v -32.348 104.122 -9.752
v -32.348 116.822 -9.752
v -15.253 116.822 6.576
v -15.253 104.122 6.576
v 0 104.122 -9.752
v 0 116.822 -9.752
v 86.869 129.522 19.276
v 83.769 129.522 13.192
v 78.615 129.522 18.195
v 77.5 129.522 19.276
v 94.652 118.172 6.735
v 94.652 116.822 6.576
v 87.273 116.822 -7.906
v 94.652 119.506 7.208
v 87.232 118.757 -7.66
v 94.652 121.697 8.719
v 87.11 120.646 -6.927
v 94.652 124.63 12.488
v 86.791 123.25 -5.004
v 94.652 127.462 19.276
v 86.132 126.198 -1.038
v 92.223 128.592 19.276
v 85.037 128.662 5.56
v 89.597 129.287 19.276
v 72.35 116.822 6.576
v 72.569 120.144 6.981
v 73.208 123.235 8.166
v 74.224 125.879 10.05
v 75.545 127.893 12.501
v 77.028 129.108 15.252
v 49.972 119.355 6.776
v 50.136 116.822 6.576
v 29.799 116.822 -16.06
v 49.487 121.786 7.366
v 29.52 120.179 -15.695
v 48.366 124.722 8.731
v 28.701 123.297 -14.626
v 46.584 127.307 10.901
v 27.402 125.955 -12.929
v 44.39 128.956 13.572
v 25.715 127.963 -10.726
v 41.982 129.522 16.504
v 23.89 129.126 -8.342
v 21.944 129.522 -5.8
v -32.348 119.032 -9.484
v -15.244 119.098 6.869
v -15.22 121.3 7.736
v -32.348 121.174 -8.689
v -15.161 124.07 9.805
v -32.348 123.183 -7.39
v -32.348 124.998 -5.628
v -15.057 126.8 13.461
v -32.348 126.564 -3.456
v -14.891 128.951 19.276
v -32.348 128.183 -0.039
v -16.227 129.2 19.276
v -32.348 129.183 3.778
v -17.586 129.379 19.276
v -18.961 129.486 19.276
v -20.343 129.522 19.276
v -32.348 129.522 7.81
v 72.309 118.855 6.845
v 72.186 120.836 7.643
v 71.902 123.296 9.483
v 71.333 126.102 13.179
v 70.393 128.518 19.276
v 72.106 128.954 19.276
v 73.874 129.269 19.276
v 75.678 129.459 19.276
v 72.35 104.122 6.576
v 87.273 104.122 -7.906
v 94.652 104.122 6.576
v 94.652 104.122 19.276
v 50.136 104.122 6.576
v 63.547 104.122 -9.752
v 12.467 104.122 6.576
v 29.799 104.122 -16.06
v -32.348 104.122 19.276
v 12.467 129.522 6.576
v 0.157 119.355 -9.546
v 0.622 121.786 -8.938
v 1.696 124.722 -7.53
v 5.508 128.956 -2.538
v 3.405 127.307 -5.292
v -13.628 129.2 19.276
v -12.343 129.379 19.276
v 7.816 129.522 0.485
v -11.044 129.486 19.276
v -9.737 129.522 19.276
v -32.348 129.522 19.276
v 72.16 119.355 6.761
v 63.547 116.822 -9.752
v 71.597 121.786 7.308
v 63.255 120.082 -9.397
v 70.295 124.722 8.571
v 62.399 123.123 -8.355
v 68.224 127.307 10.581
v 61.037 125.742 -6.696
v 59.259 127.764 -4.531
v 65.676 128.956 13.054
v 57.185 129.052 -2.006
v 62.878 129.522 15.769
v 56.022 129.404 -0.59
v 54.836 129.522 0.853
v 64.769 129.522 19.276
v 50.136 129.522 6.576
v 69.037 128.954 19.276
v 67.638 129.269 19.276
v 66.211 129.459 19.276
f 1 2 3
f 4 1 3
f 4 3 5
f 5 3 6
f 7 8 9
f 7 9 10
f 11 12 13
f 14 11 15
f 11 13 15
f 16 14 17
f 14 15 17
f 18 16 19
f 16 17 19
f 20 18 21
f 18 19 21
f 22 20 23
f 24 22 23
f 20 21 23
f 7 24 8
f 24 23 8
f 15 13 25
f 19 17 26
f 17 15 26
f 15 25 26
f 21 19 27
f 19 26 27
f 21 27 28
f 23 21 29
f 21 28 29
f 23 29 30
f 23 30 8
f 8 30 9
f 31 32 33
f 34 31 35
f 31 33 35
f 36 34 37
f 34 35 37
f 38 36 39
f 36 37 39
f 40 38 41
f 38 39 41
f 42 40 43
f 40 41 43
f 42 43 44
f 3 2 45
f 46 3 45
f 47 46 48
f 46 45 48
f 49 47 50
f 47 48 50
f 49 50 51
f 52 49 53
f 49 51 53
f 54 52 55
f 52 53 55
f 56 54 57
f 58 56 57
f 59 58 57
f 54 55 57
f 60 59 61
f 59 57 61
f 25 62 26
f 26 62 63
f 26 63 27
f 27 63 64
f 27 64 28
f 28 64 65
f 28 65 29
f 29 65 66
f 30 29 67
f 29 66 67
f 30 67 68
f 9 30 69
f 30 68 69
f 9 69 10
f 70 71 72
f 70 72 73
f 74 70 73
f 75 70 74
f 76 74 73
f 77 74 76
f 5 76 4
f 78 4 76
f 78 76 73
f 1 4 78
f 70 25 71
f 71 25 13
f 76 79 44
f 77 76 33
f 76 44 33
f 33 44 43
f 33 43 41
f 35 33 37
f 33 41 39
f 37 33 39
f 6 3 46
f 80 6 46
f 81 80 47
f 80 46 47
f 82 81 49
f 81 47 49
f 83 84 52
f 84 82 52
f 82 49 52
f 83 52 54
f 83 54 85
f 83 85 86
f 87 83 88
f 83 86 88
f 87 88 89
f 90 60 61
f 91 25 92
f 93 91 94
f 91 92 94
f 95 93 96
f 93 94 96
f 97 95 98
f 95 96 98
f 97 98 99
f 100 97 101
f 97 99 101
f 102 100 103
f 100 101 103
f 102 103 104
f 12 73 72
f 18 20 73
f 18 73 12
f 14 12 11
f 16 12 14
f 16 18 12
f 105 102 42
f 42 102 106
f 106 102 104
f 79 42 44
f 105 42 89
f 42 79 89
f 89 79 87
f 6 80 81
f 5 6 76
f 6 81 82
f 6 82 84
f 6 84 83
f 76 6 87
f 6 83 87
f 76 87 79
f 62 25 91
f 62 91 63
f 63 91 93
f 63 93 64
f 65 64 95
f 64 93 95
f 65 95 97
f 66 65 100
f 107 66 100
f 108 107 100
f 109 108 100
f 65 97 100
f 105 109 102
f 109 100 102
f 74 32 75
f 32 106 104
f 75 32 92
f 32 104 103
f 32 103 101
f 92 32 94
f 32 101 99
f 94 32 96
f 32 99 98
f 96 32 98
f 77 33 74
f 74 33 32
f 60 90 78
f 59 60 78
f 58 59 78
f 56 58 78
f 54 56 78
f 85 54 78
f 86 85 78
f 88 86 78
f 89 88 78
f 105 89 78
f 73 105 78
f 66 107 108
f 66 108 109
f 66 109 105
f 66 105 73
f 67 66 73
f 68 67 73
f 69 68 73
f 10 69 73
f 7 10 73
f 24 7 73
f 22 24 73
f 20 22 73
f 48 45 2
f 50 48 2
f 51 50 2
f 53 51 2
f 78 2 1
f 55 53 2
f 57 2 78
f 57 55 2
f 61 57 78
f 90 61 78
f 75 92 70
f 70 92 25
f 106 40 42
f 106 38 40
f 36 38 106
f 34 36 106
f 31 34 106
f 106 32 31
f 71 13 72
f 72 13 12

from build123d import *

# Parameters (mm, degrees)
SKETCH1_W           = 127
SKETCH1_H           = 12.7
BOSS_EXTRUDE1_DEPTH = 25.4
BOSS_EXTRUDE2_DEPTH = 25.4
FILLET2_R           = 12.7


with BuildPart() as part:
    # Sketch1 → Boss-Extrude1 (new body)
    with BuildSketch(Plane(origin=(0, 129.522150418, 0), x_dir=(1, 0, 0), z_dir=(0, 1, 0))):
        with Locations((31.151863223, -12.926286206)):
            Rectangle(SKETCH1_W, SKETCH1_H)
    extrude(amount=-BOSS_EXTRUDE1_DEPTH)

    # Sketch2 → Boss-Extrude2 (add)
    with BuildSketch(Plane(origin=(0, 129.522150418, 0), x_dir=(1, 0, 0), z_dir=(0, 1, 0))):
        Polygon((-32.348136777, -6.576286206), (-32.348136777, 9.752049173), (-15.252779509, -6.576286206), (0, 9.752049173), (12.467334528, -6.576286206), (29.798968938, 16.059617503), (50.135874056, -6.576286206), (63.546845791, 9.752049173), (72.350442693, -6.576286206), (87.272954796, 7.906046983), (94.651863223, -6.576286206), (94.651863223, -10.496577103), (-32.348136777, -10.496577103), align=None)
    extrude(amount=-BOSS_EXTRUDE2_DEPTH)

    # Fillet2
    # the kernel refuses this fillet: 12.7 mm, written as the material it takes off along each edge
    with BuildSketch(Plane(origin=(-55.307939563, 129.522150418, -31.681708451), x_dir=(0, -1, 0), z_dir=(0.7231433948257096, 0, 0.6906979300098909))) as fillet2_piece_1_section:
        with BuildLine():
            CenterArc((FILLET2_R, -FILLET2_R), FILLET2_R, 90, 90)
            Line((0, -FILLET2_R), (-FILLET2_R * 0.02, -FILLET2_R))
            Line((-FILLET2_R * 0.02, -FILLET2_R), (-FILLET2_R * 0.02, FILLET2_R * 0.02))
            Line((-FILLET2_R * 0.02, FILLET2_R * 0.02), (FILLET2_R, FILLET2_R * 0.02))
            Line((FILLET2_R, FILLET2_R * 0.02), (FILLET2_R, 0))
        make_face()
    fillet2_piece_1 = extrude(amount=87.140342137, mode=Mode.PRIVATE)
    fillet2_piece_1 = split(fillet2_piece_1, bisect_by=Plane(origin=(-32.348136777, 126.447150631, 1.093343092), z_dir=(1, 0, 0)), keep=Keep.TOP, mode=Mode.PRIVATE)
    fillet2_piece_1 = split(fillet2_piece_1, bisect_by=Plane(origin=(-16.904261861, 126.447150631, 8.344223498), z_dir=(-0.7307649934126457, 0, -0.682629126541357)), keep=Keep.TOP, mode=Mode.PRIVATE)
    add(fillet2_piece_1, mode=Mode.SUBTRACT)
    with BuildSketch(Plane(origin=(-36.926254277, 129.522150418, 29.778074747), x_dir=(0, -1, 0), z_dir=(0.682629126541357, 0, -0.7307649934126457))) as fillet2_piece_2_section:
        with BuildLine():
            CenterArc((FILLET2_R, -FILLET2_R), FILLET2_R, 90, 90)
            Line((0, -FILLET2_R), (-FILLET2_R * 0.02, -FILLET2_R))
            Line((-FILLET2_R * 0.02, -FILLET2_R), (-FILLET2_R * 0.02, FILLET2_R * 0.02))
            Line((-FILLET2_R * 0.02, FILLET2_R * 0.02), (FILLET2_R, FILLET2_R * 0.02))
            Line((FILLET2_R, FILLET2_R * 0.02), (FILLET2_R, 0))
        make_face()
    fillet2_piece_2 = extrude(amount=85.844167449, mode=Mode.PRIVATE)
    fillet2_piece_2 = split(fillet2_piece_2, bisect_by=Plane(origin=(-13.300421888, 126.615006844, 8.441046884), z_dir=(0.6906979300098909, 0, -0.7231433948257096)), keep=Keep.TOP, mode=Mode.PRIVATE)
    fillet2_piece_2 = split(fillet2_piece_2, bisect_by=Plane(origin=(2.843037706, 126.615006844, -6.02855294), z_dir=(-0.7948048188192111, 0, 0.6068651415114903)), keep=Keep.TOP, mode=Mode.PRIVATE)
    add(fillet2_piece_2, mode=Mode.SUBTRACT)
    with BuildSketch(Plane(origin=(72.859080389, 129.522150418, -36.195669189), x_dir=(0, -1, 0), z_dir=(0.45398029626708136, 0, 0.8910117230436719))) as fillet2_piece_3_section:
        with BuildLine():
            CenterArc((FILLET2_R, -FILLET2_R), FILLET2_R, 90, 90)
            Line((0, -FILLET2_R), (-FILLET2_R * 0.02, -FILLET2_R))
            Line((-FILLET2_R * 0.02, -FILLET2_R), (-FILLET2_R * 0.02, FILLET2_R * 0.02))
            Line((-FILLET2_R * 0.02, FILLET2_R * 0.02), (FILLET2_R, FILLET2_R * 0.02))
            Line((FILLET2_R, FILLET2_R * 0.02), (FILLET2_R, 0))
        make_face()
    fillet2_piece_3 = extrude(amount=79.753807682, mode=Mode.PRIVATE)
    fillet2_piece_3 = split(fillet2_piece_3, bisect_by=Plane(origin=(82.345210733, 126.995605854, -3.123659748), z_dir=(0.6964436437658211, 0, 0.7176114903331651)), keep=Keep.TOP, mode=Mode.PRIVATE)
    fillet2_piece_3 = split(fillet2_piece_3, bisect_by=Plane(origin=(94.651863223, 126.995605854, 4.414676038), z_dir=(-1, 0, 0)), keep=Keep.TOP, mode=Mode.PRIVATE)
    add(fillet2_piece_3, mode=Mode.SUBTRACT)
    with BuildSketch(Plane(origin=(49.566277875, 129.522150418, 28.688371895), x_dir=(0, -1, 0), z_dir=(0.7176114903331651, 0, -0.6964436437658211))) as fillet2_piece_4_section:
        with BuildLine():
            CenterArc((FILLET2_R, -FILLET2_R), FILLET2_R, 90, 90)
            Line((0, -FILLET2_R), (-FILLET2_R * 0.02, -FILLET2_R))
            Line((-FILLET2_R * 0.02, -FILLET2_R), (-FILLET2_R * 0.02, FILLET2_R * 0.02))
            Line((-FILLET2_R * 0.02, FILLET2_R * 0.02), (FILLET2_R, FILLET2_R * 0.02))
            Line((FILLET2_R, FILLET2_R * 0.02), (FILLET2_R, 0))
        make_face()
    fillet2_piece_4 = extrude(amount=84.294695045, mode=Mode.PRIVATE)
    fillet2_piece_4 = split(fillet2_piece_4, bisect_by=Plane(origin=(72.424381475, 126.641527383, 6.713423019), z_dir=(0.8802140747510399, 0, -0.4745768458428739)), keep=Keep.TOP, mode=Mode.PRIVATE)
    fillet2_piece_4 = split(fillet2_piece_4, bisect_by=Plane(origin=(90.021052177, 126.641527383, -2.512449501), z_dir=(-0.8910117230436719, 0, 0.45398029626708136)), keep=Keep.TOP, mode=Mode.PRIVATE)
    add(fillet2_piece_4, mode=Mode.SUBTRACT)
    with BuildSketch(Plane(origin=(48.479030935, 129.522150418, -37.698846047), x_dir=(0, -1, 0), z_dir=(0.47457684584287385, 0, 0.8802140747510397))) as fillet2_piece_5_section:
        with BuildLine():
            CenterArc((FILLET2_R, -FILLET2_R), FILLET2_R, 90, 90)
            Line((0, -FILLET2_R), (-FILLET2_R * 0.02, -FILLET2_R))
            Line((-FILLET2_R * 0.02, -FILLET2_R), (-FILLET2_R * 0.02, FILLET2_R * 0.02))
            Line((-FILLET2_R * 0.02, FILLET2_R * 0.02), (FILLET2_R, FILLET2_R * 0.02))
            Line((FILLET2_R, FILLET2_R * 0.02), (FILLET2_R, 0))
        make_face()
    fillet2_piece_5 = extrude(amount=82.050413868, mode=Mode.PRIVATE)
    fillet2_piece_5 = split(fillet2_piece_5, bisect_by=Plane(origin=(59.422424103, 126.616162938, -4.730418982), z_dir=(0.7727631490947523, 0, 0.6346945055703268)), keep=Keep.TOP, mode=Mode.PRIVATE)
    fillet2_piece_5 = split(fillet2_piece_5, bisect_by=Plane(origin=(72.023472886, 126.616162938, 6.893611175), z_dir=(-0.6964436437658211, 0, -0.7176114903331651)), keep=Keep.TOP, mode=Mode.PRIVATE)
    add(fillet2_piece_5, mode=Mode.SUBTRACT)
    with BuildSketch(Plane(origin=(8.579757917, 129.522150418, -39.677567957), x_dir=(0, -1, 0), z_dir=(0.668321606968674, 0, 0.7438724552359828))) as fillet2_piece_6_section:
        with BuildLine():
            CenterArc((FILLET2_R, -FILLET2_R), FILLET2_R, 90, 90)
            Line((0, -FILLET2_R), (-FILLET2_R * 0.02, -FILLET2_R))
            Line((-FILLET2_R * 0.02, -FILLET2_R), (-FILLET2_R * 0.02, FILLET2_R * 0.02))
            Line((-FILLET2_R * 0.02, FILLET2_R * 0.02), (FILLET2_R, FILLET2_R * 0.02))
            Line((FILLET2_R, FILLET2_R * 0.02), (FILLET2_R, 0))
        make_face()
    fillet2_piece_6 = extrude(amount=93.929818377, mode=Mode.PRIVATE)
    fillet2_piece_6 = split(fillet2_piece_6, bisect_by=Plane(origin=(26.326574594, 126.641800239, -11.524512379), z_dir=(0.7939882740207107, 0, 0.6079330725644171)), keep=Keep.TOP, mode=Mode.PRIVATE)
    fillet2_piece_6 = split(fillet2_piece_6, bisect_by=Plane(origin=(49.745548911, 126.641800239, 7.051520961), z_dir=(-0.7727631490947523, 0, -0.6346945055703268)), keep=Keep.TOP, mode=Mode.PRIVATE)
    add(fillet2_piece_6, mode=Mode.SUBTRACT)
    with BuildSketch(Plane(origin=(-55.307939563, 129.522150418, -31.681708451), x_dir=(0, -1, 0), z_dir=(0.7231433948257096, 0, 0.6906979300098909))) as fillet2_piece_7a_section:
        with BuildLine():
            CenterArc((FILLET2_R, -FILLET2_R), FILLET2_R, 90, 90)
            Line((0, -FILLET2_R), (-FILLET2_R * 0.02, -FILLET2_R))
            Line((-FILLET2_R * 0.02, -FILLET2_R), (-FILLET2_R * 0.02, FILLET2_R * 0.02))
            Line((-FILLET2_R * 0.02, FILLET2_R * 0.02), (FILLET2_R, FILLET2_R * 0.02))
            Line((FILLET2_R, FILLET2_R * 0.02), (FILLET2_R, 0))
        make_face()
    fillet2_piece_7a = extrude(amount=87.140342137, mode=Mode.PRIVATE)
    fillet2_piece_7a = split(fillet2_piece_7a, bisect_by=Plane(origin=(-17.333974575, 126.645382706, 8.804237577), z_dir=(0.7307649934126457, 0, 0.682629126541357)), keep=Keep.TOP, mode=Mode.PRIVATE)
    with BuildSketch(Plane(origin=(-36.926254277, 129.522150418, 29.778074747), x_dir=(0, -1, 0), z_dir=(0.682629126541357, 0, -0.7307649934126457))) as fillet2_piece_7b_section:
        with BuildLine():
            CenterArc((FILLET2_R, -FILLET2_R), FILLET2_R, 90, 90)
            Line((0, -FILLET2_R), (-FILLET2_R * 0.02, -FILLET2_R))
            Line((-FILLET2_R * 0.02, -FILLET2_R), (-FILLET2_R * 0.02, FILLET2_R * 0.02))
            Line((-FILLET2_R * 0.02, FILLET2_R * 0.02), (FILLET2_R, FILLET2_R * 0.02))
            Line((FILLET2_R, FILLET2_R * 0.02), (FILLET2_R, 0))
        make_face()
    fillet2_piece_7b = extrude(amount=85.844167449, mode=Mode.PRIVATE)
    fillet2_piece_7b = split(fillet2_piece_7b, bisect_by=Plane(origin=(-13.048064816, 126.645382706, 8.682081385), z_dir=(-0.6906979300098909, 0, 0.7231433948257096)), keep=Keep.TOP, mode=Mode.PRIVATE)
    fillet2_piece_7 = fillet2_piece_7a & fillet2_piece_7b
    add(fillet2_piece_7, mode=Mode.SUBTRACT)
    with BuildSketch(Plane(origin=(49.566277875, 129.522150418, 28.688371895), x_dir=(0, -1, 0), z_dir=(0.7176114903331651, 0, -0.6964436437658211))) as fillet2_piece_8a_section:
        with BuildLine():
            CenterArc((FILLET2_R, -FILLET2_R), FILLET2_R, 90, 90)
            Line((0, -FILLET2_R), (-FILLET2_R * 0.02, -FILLET2_R))
            Line((-FILLET2_R * 0.02, -FILLET2_R), (-FILLET2_R * 0.02, FILLET2_R * 0.02))
            Line((-FILLET2_R * 0.02, FILLET2_R * 0.02), (FILLET2_R, FILLET2_R * 0.02))
            Line((FILLET2_R, FILLET2_R * 0.02), (FILLET2_R, 0))
        make_face()
    fillet2_piece_8a = extrude(amount=84.294695045, mode=Mode.PRIVATE)
    fillet2_piece_8a = split(fillet2_piece_8a, bisect_by=Plane(origin=(86.487490403, 126.688787651, -9.447651295), z_dir=(0.8910117230436719, 0, -0.45398029626708136)), keep=Keep.TOP, mode=Mode.PRIVATE)
    with BuildSketch(Plane(origin=(72.859080389, 129.522150418, -36.195669189), x_dir=(0, -1, 0), z_dir=(0.45398029626708136, 0, 0.8910117230436719))) as fillet2_piece_8b_section:
        with BuildLine():
            CenterArc((FILLET2_R, -FILLET2_R), FILLET2_R, 90, 90)
            Line((0, -FILLET2_R), (-FILLET2_R * 0.02, -FILLET2_R))
            Line((-FILLET2_R * 0.02, -FILLET2_R), (-FILLET2_R * 0.02, FILLET2_R * 0.02))
            Line((-FILLET2_R * 0.02, FILLET2_R * 0.02), (FILLET2_R, FILLET2_R * 0.02))
            Line((FILLET2_R, FILLET2_R * 0.02), (FILLET2_R, 0))
        make_face()
    fillet2_piece_8b = extrude(amount=79.753807682, mode=Mode.PRIVATE)
    fillet2_piece_8b = split(fillet2_piece_8b, bisect_by=Plane(origin=(88.514546729, 126.688787651, -9.111014882), z_dir=(-0.6964436437658211, 0, -0.7176114903331651)), keep=Keep.TOP, mode=Mode.PRIVATE)
    fillet2_piece_8 = fillet2_piece_8a & fillet2_piece_8b
    add(fillet2_piece_8, mode=Mode.SUBTRACT)
    with BuildSketch(Plane(origin=(48.479030935, 129.522150418, -37.698846047), x_dir=(0, -1, 0), z_dir=(0.47457684584287385, 0, 0.8802140747510397))) as fillet2_piece_9a_section:
        with BuildLine():
            CenterArc((FILLET2_R, -FILLET2_R), FILLET2_R, 90, 90)
            Line((0, -FILLET2_R), (-FILLET2_R * 0.02, -FILLET2_R))
            Line((-FILLET2_R * 0.02, -FILLET2_R), (-FILLET2_R * 0.02, FILLET2_R * 0.02))
            Line((-FILLET2_R * 0.02, FILLET2_R * 0.02), (FILLET2_R, FILLET2_R * 0.02))
            Line((FILLET2_R, FILLET2_R * 0.02), (FILLET2_R, 0))
        make_face()
    fillet2_piece_9a = extrude(amount=82.050413868, mode=Mode.PRIVATE)
    fillet2_piece_9a = split(fillet2_piece_9a, bisect_by=Plane(origin=(67.231034688, 126.606396311, 11.544683748), z_dir=(0.6964436437658211, 0, 0.7176114903331651)), keep=Keep.TOP, mode=Mode.PRIVATE)
    with BuildSketch(Plane(origin=(49.566277875, 129.522150418, 28.688371895), x_dir=(0, -1, 0), z_dir=(0.7176114903331651, 0, -0.6964436437658211))) as fillet2_piece_9b_section:
        with BuildLine():
            CenterArc((FILLET2_R, -FILLET2_R), FILLET2_R, 90, 90)
            Line((0, -FILLET2_R), (-FILLET2_R * 0.02, -FILLET2_R))
            Line((-FILLET2_R * 0.02, -FILLET2_R), (-FILLET2_R * 0.02, FILLET2_R * 0.02))
            Line((-FILLET2_R * 0.02, FILLET2_R * 0.02), (FILLET2_R, FILLET2_R * 0.02))
            Line((FILLET2_R, FILLET2_R * 0.02), (FILLET2_R, 0))
        make_face()
    fillet2_piece_9b = extrude(amount=84.294695045, mode=Mode.PRIVATE)
    fillet2_piece_9b = split(fillet2_piece_9b, bisect_by=Plane(origin=(75.736052506, 126.606396311, 12.855693714), z_dir=(-0.8802140747510399, 0, 0.4745768458428739)), keep=Keep.TOP, mode=Mode.PRIVATE)
    fillet2_piece_9 = fillet2_piece_9a & fillet2_piece_9b
    add(fillet2_piece_9, mode=Mode.SUBTRACT)


solid = part.part
